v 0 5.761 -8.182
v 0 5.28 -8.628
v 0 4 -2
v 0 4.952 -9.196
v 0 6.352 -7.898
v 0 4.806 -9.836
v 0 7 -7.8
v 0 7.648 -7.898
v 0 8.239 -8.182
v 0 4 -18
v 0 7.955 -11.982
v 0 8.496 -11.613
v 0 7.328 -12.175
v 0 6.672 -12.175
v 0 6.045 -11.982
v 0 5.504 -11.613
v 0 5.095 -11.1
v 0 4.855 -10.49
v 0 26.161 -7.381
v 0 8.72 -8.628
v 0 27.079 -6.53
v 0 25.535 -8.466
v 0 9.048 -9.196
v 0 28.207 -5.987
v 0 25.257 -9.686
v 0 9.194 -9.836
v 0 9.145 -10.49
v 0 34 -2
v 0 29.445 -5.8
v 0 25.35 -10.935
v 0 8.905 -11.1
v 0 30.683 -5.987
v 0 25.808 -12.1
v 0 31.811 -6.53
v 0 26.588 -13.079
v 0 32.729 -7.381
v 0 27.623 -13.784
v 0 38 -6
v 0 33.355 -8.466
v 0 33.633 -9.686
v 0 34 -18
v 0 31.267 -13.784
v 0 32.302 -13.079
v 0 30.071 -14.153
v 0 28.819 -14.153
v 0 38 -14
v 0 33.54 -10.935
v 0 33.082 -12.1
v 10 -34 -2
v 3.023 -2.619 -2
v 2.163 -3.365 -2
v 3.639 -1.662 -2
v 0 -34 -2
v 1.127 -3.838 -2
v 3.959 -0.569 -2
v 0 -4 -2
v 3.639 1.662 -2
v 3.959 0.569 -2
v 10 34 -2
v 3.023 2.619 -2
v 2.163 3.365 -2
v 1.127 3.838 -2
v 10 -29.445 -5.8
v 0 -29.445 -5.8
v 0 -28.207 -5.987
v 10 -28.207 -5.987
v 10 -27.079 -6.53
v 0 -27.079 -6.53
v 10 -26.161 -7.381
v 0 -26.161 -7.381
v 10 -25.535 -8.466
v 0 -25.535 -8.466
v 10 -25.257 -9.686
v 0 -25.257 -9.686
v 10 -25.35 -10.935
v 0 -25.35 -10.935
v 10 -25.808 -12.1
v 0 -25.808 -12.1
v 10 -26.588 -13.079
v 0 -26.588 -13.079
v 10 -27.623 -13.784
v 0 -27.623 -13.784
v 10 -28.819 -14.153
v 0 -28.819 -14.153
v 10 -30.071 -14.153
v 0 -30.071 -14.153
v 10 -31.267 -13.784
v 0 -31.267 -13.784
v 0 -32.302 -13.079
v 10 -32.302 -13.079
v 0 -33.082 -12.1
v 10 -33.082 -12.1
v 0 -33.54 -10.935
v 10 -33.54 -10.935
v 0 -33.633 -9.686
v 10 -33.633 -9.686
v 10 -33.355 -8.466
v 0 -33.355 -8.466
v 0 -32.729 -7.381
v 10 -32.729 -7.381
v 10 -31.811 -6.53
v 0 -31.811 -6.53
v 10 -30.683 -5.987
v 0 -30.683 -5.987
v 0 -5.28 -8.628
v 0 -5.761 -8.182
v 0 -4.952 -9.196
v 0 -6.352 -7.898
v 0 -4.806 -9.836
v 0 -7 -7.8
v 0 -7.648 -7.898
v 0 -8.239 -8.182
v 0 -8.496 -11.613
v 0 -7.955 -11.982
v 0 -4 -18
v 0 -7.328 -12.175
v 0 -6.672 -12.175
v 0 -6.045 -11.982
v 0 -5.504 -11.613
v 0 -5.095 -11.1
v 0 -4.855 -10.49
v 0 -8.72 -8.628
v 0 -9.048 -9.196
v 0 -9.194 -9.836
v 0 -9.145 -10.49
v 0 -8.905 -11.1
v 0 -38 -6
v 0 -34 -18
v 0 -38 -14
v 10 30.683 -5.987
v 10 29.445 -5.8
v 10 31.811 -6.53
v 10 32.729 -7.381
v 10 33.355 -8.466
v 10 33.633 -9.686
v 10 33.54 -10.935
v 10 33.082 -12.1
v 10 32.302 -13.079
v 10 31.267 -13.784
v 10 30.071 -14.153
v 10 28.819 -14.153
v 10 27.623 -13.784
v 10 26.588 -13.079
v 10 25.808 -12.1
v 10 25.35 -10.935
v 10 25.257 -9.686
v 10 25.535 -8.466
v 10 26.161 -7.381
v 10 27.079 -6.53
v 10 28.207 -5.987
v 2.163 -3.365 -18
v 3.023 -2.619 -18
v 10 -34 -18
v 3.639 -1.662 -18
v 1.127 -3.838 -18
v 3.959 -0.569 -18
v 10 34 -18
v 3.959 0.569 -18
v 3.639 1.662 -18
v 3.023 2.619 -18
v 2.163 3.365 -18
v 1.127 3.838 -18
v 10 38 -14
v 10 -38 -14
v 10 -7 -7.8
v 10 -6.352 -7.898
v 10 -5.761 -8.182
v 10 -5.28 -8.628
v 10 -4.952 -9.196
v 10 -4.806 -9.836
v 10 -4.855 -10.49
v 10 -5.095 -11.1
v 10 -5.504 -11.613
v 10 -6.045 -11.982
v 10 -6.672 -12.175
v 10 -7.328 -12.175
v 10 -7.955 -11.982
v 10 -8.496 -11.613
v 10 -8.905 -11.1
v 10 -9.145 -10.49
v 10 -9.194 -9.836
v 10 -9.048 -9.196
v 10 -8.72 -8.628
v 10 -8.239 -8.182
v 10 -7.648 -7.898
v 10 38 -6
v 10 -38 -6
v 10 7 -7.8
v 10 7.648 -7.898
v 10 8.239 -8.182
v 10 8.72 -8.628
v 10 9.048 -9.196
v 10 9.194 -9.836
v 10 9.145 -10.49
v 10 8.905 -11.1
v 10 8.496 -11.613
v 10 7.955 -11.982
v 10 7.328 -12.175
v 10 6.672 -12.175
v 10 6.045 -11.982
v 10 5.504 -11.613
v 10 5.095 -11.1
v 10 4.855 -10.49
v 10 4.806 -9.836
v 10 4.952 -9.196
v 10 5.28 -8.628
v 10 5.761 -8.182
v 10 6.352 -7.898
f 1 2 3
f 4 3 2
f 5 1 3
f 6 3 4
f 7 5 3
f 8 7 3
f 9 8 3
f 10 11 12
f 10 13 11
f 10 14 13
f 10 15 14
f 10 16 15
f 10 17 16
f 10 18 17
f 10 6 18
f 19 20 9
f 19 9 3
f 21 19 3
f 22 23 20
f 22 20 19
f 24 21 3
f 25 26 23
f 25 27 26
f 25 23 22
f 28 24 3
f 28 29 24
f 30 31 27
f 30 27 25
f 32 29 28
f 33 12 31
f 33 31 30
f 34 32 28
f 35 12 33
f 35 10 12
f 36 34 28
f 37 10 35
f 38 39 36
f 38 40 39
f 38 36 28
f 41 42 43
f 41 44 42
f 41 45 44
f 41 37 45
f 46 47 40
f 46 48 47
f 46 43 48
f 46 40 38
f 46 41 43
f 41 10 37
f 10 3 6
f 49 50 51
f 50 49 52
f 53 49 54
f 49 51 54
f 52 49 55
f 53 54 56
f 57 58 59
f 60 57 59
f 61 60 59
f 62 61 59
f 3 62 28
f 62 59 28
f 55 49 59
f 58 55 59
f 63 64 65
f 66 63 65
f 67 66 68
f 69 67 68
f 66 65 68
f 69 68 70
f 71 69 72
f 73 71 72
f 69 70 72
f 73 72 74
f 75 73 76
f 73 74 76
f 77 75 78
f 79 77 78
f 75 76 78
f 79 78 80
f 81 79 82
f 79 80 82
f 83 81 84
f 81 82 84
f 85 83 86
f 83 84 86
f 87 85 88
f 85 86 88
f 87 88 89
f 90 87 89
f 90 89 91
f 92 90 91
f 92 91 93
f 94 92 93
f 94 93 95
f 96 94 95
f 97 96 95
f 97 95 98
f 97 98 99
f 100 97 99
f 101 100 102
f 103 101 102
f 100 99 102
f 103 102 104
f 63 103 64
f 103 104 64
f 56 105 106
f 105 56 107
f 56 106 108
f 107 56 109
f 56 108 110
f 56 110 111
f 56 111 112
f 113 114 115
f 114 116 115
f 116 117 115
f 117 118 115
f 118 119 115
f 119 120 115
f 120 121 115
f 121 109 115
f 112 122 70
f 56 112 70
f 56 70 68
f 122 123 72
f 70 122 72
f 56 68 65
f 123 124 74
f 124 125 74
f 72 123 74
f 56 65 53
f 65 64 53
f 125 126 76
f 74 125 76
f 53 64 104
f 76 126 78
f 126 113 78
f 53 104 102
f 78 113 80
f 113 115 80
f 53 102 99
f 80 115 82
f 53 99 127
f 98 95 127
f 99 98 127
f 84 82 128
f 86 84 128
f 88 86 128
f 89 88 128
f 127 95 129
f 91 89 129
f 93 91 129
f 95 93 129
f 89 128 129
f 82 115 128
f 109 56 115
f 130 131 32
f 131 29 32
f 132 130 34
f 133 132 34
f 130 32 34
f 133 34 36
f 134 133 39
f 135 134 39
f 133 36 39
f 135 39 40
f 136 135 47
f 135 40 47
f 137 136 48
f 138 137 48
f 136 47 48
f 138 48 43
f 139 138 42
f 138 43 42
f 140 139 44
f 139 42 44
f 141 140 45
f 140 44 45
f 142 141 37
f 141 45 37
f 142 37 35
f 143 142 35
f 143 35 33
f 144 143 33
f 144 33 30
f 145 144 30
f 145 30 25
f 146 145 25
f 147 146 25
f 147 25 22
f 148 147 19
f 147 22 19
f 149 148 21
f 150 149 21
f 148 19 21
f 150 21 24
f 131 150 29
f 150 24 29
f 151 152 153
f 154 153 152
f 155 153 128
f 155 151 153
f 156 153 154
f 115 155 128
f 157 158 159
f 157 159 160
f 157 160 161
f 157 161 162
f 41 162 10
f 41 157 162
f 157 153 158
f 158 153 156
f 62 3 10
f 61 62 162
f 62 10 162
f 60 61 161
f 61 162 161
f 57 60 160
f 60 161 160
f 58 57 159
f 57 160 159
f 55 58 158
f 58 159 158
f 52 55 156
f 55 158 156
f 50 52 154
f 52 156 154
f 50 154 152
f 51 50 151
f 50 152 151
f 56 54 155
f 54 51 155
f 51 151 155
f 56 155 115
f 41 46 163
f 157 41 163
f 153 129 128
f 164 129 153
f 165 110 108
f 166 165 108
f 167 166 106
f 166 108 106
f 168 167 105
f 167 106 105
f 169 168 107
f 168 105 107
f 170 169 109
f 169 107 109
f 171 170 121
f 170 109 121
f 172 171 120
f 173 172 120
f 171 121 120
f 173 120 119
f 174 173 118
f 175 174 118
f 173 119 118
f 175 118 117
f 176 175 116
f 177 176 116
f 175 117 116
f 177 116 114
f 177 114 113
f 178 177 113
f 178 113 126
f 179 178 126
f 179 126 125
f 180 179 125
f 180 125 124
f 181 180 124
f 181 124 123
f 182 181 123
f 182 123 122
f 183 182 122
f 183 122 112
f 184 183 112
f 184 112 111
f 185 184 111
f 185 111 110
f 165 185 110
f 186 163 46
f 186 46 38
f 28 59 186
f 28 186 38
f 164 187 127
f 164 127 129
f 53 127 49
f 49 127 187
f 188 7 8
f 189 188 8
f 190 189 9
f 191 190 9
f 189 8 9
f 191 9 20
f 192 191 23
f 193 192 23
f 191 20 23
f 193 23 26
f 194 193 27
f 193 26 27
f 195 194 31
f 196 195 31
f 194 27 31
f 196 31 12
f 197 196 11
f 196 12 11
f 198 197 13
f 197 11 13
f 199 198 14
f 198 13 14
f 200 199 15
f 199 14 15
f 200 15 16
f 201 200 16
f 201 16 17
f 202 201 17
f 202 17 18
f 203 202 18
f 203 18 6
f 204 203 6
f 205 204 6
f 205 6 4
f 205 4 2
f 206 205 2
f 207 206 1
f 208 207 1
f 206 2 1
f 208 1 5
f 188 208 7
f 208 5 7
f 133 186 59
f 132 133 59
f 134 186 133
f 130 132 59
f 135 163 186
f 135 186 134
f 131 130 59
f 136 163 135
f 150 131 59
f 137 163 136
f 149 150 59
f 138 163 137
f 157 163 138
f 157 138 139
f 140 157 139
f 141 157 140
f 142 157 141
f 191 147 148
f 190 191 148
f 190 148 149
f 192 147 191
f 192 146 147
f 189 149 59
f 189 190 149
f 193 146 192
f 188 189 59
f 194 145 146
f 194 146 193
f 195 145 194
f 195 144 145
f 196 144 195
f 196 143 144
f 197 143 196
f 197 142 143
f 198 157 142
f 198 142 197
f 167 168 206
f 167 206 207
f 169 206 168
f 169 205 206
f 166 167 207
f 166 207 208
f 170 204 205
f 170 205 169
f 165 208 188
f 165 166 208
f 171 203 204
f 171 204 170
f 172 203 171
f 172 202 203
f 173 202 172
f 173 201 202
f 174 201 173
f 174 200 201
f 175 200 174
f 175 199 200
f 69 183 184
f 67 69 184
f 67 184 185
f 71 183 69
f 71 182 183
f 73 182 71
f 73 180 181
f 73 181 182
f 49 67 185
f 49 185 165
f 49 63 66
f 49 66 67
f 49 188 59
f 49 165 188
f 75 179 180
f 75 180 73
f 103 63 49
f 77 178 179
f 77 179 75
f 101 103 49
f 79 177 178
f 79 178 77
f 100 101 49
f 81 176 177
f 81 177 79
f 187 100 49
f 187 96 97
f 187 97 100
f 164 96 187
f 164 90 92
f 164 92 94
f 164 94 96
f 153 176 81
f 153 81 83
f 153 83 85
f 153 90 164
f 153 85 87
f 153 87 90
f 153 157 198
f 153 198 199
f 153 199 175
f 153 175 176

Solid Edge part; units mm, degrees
sketch "Sketch1" plane through (0, 0, -10) normal (0, 0, 1) x (1, 0, 0)
  line L0 (0, 4) -> (0, 40)
  line L1 (0, 40) -> (10, 40)
  line L2 (10, 40) -> (10, 0)
  line L3 (10, -40) -> (10, 0)
  line L4 (0, -40) -> (10, -40)
  line L5 (0, -4) -> (0, -40)
  arc A0 (0, -4) -> (0, 4) centre (0, 0) ccw
extrude "ExtrudedProtrusion_1" add sketch "Sketch1" along normal mid plane 16
sketch "Sketch2" plane through (0, 21, -10) normal (-1, 0, 0) x (0, 0, 1)
  circle A0 centre (0, 8.4449) radius 4.2
  circle A1 centre (0, -50.4449) radius 4.2
  dimension "D1" = 58.8897
extrude "Cutout1" cut sketch "Sketch2" against normal through all
sketch "Sketch3" plane through (0, 21, -10) normal (-1, 0, 0) x (0, 0, 1)
  circle A0 centre (0, -14) radius 2.2
  dimension "D1" = 3
  dimension "D2" = 4.4
extrude "Cutout2" cut sketch "Sketch3" against normal through all
mirror "Mirror1" about plane through (0, 0, 0) normal (0, -1, 0) of "Cutout2"
sketch "Sketch4" plane through (10, 0, -10) normal (1, 0, 0) x (0, 1, 0)
  line L0 (0, 8) -> (-38, 8)
  line L1 (-38, 8) -> (-38, -14.4218)
extrude "Cutout4" cut sketch "Sketch4" against normal through all material side at (10, -19, -1.95)
mirror "Mirror2" about plane through (0, 0, 0) normal (0, -1, 0) of "Cutout4"
chamfer "Chamfer_1" distance 4 angle 45 4 edges at (5, -38, -2) (5, -38, -18) (5, 38, -2) (5, 38, -18)
